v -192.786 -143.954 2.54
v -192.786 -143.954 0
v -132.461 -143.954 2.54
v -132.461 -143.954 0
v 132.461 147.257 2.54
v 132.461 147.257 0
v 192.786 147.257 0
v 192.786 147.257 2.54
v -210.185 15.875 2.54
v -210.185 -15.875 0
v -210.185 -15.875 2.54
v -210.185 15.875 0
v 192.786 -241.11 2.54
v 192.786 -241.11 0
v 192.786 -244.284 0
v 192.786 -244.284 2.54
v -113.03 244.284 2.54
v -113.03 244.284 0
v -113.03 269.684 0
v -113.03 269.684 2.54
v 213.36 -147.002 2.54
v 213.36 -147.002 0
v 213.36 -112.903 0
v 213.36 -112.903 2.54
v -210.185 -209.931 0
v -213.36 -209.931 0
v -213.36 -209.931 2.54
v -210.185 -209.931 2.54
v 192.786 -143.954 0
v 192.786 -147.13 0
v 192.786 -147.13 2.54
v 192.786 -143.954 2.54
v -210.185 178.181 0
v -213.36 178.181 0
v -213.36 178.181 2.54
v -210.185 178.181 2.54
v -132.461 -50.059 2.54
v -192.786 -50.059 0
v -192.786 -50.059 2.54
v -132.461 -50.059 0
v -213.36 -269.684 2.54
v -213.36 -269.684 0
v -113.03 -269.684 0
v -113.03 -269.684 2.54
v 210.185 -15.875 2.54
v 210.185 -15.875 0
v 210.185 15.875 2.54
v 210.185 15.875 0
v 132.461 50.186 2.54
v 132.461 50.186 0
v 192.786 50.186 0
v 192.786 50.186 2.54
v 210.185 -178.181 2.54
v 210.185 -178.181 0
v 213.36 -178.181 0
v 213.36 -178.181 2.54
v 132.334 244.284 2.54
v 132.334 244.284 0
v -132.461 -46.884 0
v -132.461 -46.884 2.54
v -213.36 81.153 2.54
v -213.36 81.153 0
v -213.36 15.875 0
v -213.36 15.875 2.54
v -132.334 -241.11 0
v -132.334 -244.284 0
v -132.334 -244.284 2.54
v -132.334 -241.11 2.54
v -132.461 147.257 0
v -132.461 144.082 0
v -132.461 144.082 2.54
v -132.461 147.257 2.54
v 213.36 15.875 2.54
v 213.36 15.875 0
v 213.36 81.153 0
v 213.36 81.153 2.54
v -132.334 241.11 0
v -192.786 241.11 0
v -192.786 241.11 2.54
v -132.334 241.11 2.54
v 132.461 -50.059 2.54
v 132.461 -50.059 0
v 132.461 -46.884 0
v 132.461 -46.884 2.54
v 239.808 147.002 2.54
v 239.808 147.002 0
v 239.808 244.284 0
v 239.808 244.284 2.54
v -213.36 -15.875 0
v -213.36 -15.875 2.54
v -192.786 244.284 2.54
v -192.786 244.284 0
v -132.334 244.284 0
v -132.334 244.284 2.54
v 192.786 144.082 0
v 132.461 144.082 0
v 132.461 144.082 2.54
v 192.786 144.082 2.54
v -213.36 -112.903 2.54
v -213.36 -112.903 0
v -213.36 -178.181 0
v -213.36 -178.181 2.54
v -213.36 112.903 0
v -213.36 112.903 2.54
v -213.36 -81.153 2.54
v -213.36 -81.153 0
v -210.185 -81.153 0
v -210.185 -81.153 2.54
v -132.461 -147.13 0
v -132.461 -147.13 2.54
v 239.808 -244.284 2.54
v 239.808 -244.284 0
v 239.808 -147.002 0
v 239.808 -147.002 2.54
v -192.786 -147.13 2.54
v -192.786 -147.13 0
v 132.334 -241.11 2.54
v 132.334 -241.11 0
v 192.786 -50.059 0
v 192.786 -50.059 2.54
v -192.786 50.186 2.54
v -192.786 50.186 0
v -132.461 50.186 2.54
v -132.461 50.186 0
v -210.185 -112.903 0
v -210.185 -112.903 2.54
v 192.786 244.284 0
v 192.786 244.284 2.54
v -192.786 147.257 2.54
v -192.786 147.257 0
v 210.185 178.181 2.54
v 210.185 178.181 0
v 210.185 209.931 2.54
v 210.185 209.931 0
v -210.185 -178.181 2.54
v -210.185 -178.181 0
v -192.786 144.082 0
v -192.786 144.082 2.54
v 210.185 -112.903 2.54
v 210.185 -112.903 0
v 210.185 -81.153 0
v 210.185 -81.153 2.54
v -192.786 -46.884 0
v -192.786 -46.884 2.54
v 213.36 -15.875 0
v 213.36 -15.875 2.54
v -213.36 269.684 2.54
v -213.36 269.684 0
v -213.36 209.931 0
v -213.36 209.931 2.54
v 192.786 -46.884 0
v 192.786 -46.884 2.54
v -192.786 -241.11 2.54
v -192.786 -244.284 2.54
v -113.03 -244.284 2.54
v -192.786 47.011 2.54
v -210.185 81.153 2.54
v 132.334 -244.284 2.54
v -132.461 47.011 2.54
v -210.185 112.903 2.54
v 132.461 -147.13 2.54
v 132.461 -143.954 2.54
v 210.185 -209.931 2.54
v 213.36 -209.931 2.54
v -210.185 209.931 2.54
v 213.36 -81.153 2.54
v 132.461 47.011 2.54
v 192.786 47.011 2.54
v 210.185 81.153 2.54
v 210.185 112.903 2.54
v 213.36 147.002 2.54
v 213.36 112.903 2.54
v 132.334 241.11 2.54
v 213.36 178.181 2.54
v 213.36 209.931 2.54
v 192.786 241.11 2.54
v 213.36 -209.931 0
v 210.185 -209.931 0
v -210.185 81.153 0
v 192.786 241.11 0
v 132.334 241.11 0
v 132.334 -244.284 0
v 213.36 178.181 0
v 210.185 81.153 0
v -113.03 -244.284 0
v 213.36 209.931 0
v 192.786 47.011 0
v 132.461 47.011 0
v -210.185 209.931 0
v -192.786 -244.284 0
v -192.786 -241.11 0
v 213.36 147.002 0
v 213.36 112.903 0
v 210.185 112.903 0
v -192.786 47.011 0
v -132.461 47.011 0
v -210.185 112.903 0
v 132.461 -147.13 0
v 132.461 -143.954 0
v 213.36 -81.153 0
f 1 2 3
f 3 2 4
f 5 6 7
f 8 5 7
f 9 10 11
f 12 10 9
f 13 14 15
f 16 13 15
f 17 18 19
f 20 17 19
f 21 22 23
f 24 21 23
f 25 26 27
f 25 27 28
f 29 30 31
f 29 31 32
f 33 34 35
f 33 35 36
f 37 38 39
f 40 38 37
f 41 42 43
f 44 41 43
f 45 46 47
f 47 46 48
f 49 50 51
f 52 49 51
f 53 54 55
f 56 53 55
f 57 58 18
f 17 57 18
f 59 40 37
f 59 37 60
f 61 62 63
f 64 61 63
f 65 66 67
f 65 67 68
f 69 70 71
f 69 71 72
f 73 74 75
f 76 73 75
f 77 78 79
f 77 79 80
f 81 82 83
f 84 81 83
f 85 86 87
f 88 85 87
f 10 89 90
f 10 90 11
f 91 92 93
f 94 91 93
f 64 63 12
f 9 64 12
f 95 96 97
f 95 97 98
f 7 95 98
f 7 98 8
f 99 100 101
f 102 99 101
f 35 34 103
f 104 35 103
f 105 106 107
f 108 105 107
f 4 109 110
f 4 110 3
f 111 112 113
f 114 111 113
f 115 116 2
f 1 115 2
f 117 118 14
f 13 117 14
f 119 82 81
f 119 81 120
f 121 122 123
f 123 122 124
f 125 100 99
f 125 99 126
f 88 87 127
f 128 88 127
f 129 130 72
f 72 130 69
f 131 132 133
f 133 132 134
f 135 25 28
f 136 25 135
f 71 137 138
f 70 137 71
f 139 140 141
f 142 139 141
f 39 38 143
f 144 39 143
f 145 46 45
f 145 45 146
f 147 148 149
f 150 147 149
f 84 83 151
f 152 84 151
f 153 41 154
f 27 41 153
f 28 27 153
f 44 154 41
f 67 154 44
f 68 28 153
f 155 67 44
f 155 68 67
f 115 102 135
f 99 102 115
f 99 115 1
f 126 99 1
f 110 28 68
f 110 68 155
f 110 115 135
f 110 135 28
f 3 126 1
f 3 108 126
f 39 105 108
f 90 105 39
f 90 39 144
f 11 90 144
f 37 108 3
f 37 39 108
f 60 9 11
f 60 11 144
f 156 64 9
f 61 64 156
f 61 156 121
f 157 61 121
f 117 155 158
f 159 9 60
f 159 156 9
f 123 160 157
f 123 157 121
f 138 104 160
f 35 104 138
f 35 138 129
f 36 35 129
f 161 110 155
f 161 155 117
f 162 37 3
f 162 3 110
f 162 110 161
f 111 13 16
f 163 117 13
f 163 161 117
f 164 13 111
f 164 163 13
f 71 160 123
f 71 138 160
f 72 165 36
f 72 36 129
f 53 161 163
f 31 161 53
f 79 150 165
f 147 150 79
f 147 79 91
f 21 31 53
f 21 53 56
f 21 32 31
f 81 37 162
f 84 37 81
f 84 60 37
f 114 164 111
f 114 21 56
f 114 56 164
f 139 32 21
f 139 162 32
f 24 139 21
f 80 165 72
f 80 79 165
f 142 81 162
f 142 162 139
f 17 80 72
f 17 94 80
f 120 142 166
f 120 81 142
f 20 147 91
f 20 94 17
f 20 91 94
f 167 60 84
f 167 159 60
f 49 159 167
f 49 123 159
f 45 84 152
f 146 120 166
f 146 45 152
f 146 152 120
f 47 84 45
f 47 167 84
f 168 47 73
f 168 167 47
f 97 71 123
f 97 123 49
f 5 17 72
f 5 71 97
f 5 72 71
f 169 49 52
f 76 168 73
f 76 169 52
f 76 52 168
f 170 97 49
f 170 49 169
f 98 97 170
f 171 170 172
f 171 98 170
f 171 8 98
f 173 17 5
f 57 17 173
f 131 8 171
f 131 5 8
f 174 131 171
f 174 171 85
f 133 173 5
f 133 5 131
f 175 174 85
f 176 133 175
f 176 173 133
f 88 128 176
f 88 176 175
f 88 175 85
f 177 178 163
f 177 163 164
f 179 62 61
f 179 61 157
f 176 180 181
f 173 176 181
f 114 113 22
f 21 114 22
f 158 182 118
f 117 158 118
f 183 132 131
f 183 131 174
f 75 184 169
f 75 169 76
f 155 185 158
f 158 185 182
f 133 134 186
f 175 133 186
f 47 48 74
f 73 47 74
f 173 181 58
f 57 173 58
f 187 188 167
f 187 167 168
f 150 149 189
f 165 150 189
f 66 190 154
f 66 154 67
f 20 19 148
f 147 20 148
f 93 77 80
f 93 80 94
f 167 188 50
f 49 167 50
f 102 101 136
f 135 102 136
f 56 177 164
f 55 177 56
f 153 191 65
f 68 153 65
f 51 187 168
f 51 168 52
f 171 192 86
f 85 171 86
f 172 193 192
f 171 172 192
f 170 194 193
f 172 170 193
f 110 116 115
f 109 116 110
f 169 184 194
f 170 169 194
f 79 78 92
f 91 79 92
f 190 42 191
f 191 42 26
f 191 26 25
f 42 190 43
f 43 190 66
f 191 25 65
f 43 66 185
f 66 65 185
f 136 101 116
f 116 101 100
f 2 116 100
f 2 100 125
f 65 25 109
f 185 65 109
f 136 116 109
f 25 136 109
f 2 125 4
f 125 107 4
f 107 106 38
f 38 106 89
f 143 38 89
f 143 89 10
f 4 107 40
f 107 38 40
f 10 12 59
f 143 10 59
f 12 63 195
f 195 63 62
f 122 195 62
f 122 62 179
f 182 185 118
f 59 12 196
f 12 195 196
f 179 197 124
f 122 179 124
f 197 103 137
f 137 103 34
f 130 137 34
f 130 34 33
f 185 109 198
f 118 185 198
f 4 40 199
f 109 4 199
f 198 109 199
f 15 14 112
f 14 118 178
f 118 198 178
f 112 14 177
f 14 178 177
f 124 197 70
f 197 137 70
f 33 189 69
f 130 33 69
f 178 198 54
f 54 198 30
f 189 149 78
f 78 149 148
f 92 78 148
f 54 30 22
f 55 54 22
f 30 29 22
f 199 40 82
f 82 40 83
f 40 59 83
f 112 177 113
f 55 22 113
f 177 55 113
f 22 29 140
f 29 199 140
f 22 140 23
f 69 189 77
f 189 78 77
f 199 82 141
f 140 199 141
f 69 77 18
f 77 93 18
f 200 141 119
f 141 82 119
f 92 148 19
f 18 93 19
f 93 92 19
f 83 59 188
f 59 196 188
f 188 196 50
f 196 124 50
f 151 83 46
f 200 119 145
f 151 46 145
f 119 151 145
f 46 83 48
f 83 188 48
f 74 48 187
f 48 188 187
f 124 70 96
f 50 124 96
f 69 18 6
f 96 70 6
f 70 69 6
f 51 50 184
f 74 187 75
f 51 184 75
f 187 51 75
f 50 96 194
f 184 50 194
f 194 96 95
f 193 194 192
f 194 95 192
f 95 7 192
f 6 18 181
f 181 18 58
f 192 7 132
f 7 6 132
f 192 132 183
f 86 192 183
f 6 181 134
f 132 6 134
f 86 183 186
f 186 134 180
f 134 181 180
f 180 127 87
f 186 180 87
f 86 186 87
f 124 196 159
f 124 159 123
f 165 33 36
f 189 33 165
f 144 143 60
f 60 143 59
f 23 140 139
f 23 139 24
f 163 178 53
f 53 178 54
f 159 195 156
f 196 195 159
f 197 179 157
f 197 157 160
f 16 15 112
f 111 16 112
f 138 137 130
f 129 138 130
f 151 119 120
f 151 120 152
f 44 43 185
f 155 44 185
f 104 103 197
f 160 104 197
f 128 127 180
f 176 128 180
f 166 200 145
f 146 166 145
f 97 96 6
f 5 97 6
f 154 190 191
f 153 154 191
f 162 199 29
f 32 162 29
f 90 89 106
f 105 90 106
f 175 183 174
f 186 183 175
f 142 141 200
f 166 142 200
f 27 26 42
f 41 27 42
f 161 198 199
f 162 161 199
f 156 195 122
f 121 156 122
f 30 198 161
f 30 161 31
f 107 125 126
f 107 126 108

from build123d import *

# Parameters (mm, degrees)
SKETCH2_W               = 60.452
SKETCH2_H               = 3.175
BOSS_EXTRUDE3_DEPTH     = 2.54
CUT_EXTRUDE2_DEPTH      = 361.893602522
CUT_EXTRUDE2_DEPTH_BACK = 361.893602522
SKETCH4_W               = 60.325
SKETCH4_H               = 3.175
SKETCH4_W_2             = 3.175
SKETCH4_H_2             = 31.75


with BuildPart() as part:
    # Sketch2 → Boss-Extrude3 (new body)
    with BuildSketch(Plane.XY):
        Polygon((-213.36, -244.2845), (-213.36, -263.2075), (-213.36, -269.6845), (-113.03, -269.6845), (-113.03, -244.2845), (132.334, -244.2845), (132.334, -241.1095), (192.786, -241.1095), (192.786, -244.2845), (213.36, -244.2845), (239.808280092, -244.2845), (239.808280092, -147.0025), (213.36, -147.0025), (213.36, 147.0025), (239.808280092, 147.0025), (239.808280092, 244.2845), (213.36, 244.2845), (192.786, 244.2845), (192.786, 241.1095), (132.334, 241.1095), (132.334, 244.2845), (-113.03, 244.2845), (-113.03, 269.6845), (-213.36, 269.6845), (-213.36, 244.2845), align=None)
        with Locations((-162.56, -242.697)):
            Rectangle(SKETCH2_W, SKETCH2_H, mode=Mode.SUBTRACT)
        with Locations((-162.56, 242.697)):
            Rectangle(SKETCH2_W, SKETCH2_H, mode=Mode.SUBTRACT)
    extrude(amount=BOSS_EXTRUDE3_DEPTH)

    # Sketch4 → Cut-Extrude2 (cut, two sides: drawn at the far end of the back side and taken through both)
    with BuildSketch(Plane.XY.offset(2.54).offset(-CUT_EXTRUDE2_DEPTH_BACK)):
        with Locations((-162.6235, -145.542)):
            Rectangle(SKETCH4_W, SKETCH4_H)
        with Locations((-162.6235, -48.471666667)):
            Rectangle(SKETCH4_W, SKETCH4_H)
        with Locations((-162.6235, 48.598666667)):
            Rectangle(SKETCH4_W, SKETCH4_H)
        with Locations((-162.6235, 145.669)):
            Rectangle(SKETCH4_W, SKETCH4_H)
        with Locations((162.6235, -145.542)):
            Rectangle(SKETCH4_W, SKETCH4_H)
        with Locations((162.6235, -48.471666667)):
            Rectangle(SKETCH4_W, SKETCH4_H)
        with Locations((162.6235, 48.598666667)):
            Rectangle(SKETCH4_W, SKETCH4_H)
        with Locations((162.6235, 145.669)):
            Rectangle(SKETCH4_W, SKETCH4_H)
        with Locations((211.7725, -194.056)):
            Rectangle(SKETCH4_W_2, SKETCH4_H_2)
        with Locations((211.7725, -97.028)):
            Rectangle(SKETCH4_W_2, SKETCH4_H_2)
        with Locations((211.7725, 0)):
            Rectangle(SKETCH4_W_2, SKETCH4_H_2)
        with Locations((211.7725, 97.028)):
            Rectangle(SKETCH4_W_2, SKETCH4_H_2)
        with Locations((211.7725, 194.056)):
            Rectangle(SKETCH4_W_2, SKETCH4_H_2)
        with Locations((-211.7725, -97.028)):
            Rectangle(SKETCH4_W_2, SKETCH4_H_2)
        with Locations((-211.7725, 0)):
            Rectangle(SKETCH4_W_2, SKETCH4_H_2)
        with Locations((-211.7725, -194.056)):
            Rectangle(SKETCH4_W_2, SKETCH4_H_2)
        with Locations((-211.7725, 97.028)):
            Rectangle(SKETCH4_W_2, SKETCH4_H_2)
        with Locations((-211.7725, 194.056)):
            Rectangle(SKETCH4_W_2, SKETCH4_H_2)
    extrude(amount=CUT_EXTRUDE2_DEPTH + CUT_EXTRUDE2_DEPTH_BACK, mode=Mode.SUBTRACT)


solid = part.part
